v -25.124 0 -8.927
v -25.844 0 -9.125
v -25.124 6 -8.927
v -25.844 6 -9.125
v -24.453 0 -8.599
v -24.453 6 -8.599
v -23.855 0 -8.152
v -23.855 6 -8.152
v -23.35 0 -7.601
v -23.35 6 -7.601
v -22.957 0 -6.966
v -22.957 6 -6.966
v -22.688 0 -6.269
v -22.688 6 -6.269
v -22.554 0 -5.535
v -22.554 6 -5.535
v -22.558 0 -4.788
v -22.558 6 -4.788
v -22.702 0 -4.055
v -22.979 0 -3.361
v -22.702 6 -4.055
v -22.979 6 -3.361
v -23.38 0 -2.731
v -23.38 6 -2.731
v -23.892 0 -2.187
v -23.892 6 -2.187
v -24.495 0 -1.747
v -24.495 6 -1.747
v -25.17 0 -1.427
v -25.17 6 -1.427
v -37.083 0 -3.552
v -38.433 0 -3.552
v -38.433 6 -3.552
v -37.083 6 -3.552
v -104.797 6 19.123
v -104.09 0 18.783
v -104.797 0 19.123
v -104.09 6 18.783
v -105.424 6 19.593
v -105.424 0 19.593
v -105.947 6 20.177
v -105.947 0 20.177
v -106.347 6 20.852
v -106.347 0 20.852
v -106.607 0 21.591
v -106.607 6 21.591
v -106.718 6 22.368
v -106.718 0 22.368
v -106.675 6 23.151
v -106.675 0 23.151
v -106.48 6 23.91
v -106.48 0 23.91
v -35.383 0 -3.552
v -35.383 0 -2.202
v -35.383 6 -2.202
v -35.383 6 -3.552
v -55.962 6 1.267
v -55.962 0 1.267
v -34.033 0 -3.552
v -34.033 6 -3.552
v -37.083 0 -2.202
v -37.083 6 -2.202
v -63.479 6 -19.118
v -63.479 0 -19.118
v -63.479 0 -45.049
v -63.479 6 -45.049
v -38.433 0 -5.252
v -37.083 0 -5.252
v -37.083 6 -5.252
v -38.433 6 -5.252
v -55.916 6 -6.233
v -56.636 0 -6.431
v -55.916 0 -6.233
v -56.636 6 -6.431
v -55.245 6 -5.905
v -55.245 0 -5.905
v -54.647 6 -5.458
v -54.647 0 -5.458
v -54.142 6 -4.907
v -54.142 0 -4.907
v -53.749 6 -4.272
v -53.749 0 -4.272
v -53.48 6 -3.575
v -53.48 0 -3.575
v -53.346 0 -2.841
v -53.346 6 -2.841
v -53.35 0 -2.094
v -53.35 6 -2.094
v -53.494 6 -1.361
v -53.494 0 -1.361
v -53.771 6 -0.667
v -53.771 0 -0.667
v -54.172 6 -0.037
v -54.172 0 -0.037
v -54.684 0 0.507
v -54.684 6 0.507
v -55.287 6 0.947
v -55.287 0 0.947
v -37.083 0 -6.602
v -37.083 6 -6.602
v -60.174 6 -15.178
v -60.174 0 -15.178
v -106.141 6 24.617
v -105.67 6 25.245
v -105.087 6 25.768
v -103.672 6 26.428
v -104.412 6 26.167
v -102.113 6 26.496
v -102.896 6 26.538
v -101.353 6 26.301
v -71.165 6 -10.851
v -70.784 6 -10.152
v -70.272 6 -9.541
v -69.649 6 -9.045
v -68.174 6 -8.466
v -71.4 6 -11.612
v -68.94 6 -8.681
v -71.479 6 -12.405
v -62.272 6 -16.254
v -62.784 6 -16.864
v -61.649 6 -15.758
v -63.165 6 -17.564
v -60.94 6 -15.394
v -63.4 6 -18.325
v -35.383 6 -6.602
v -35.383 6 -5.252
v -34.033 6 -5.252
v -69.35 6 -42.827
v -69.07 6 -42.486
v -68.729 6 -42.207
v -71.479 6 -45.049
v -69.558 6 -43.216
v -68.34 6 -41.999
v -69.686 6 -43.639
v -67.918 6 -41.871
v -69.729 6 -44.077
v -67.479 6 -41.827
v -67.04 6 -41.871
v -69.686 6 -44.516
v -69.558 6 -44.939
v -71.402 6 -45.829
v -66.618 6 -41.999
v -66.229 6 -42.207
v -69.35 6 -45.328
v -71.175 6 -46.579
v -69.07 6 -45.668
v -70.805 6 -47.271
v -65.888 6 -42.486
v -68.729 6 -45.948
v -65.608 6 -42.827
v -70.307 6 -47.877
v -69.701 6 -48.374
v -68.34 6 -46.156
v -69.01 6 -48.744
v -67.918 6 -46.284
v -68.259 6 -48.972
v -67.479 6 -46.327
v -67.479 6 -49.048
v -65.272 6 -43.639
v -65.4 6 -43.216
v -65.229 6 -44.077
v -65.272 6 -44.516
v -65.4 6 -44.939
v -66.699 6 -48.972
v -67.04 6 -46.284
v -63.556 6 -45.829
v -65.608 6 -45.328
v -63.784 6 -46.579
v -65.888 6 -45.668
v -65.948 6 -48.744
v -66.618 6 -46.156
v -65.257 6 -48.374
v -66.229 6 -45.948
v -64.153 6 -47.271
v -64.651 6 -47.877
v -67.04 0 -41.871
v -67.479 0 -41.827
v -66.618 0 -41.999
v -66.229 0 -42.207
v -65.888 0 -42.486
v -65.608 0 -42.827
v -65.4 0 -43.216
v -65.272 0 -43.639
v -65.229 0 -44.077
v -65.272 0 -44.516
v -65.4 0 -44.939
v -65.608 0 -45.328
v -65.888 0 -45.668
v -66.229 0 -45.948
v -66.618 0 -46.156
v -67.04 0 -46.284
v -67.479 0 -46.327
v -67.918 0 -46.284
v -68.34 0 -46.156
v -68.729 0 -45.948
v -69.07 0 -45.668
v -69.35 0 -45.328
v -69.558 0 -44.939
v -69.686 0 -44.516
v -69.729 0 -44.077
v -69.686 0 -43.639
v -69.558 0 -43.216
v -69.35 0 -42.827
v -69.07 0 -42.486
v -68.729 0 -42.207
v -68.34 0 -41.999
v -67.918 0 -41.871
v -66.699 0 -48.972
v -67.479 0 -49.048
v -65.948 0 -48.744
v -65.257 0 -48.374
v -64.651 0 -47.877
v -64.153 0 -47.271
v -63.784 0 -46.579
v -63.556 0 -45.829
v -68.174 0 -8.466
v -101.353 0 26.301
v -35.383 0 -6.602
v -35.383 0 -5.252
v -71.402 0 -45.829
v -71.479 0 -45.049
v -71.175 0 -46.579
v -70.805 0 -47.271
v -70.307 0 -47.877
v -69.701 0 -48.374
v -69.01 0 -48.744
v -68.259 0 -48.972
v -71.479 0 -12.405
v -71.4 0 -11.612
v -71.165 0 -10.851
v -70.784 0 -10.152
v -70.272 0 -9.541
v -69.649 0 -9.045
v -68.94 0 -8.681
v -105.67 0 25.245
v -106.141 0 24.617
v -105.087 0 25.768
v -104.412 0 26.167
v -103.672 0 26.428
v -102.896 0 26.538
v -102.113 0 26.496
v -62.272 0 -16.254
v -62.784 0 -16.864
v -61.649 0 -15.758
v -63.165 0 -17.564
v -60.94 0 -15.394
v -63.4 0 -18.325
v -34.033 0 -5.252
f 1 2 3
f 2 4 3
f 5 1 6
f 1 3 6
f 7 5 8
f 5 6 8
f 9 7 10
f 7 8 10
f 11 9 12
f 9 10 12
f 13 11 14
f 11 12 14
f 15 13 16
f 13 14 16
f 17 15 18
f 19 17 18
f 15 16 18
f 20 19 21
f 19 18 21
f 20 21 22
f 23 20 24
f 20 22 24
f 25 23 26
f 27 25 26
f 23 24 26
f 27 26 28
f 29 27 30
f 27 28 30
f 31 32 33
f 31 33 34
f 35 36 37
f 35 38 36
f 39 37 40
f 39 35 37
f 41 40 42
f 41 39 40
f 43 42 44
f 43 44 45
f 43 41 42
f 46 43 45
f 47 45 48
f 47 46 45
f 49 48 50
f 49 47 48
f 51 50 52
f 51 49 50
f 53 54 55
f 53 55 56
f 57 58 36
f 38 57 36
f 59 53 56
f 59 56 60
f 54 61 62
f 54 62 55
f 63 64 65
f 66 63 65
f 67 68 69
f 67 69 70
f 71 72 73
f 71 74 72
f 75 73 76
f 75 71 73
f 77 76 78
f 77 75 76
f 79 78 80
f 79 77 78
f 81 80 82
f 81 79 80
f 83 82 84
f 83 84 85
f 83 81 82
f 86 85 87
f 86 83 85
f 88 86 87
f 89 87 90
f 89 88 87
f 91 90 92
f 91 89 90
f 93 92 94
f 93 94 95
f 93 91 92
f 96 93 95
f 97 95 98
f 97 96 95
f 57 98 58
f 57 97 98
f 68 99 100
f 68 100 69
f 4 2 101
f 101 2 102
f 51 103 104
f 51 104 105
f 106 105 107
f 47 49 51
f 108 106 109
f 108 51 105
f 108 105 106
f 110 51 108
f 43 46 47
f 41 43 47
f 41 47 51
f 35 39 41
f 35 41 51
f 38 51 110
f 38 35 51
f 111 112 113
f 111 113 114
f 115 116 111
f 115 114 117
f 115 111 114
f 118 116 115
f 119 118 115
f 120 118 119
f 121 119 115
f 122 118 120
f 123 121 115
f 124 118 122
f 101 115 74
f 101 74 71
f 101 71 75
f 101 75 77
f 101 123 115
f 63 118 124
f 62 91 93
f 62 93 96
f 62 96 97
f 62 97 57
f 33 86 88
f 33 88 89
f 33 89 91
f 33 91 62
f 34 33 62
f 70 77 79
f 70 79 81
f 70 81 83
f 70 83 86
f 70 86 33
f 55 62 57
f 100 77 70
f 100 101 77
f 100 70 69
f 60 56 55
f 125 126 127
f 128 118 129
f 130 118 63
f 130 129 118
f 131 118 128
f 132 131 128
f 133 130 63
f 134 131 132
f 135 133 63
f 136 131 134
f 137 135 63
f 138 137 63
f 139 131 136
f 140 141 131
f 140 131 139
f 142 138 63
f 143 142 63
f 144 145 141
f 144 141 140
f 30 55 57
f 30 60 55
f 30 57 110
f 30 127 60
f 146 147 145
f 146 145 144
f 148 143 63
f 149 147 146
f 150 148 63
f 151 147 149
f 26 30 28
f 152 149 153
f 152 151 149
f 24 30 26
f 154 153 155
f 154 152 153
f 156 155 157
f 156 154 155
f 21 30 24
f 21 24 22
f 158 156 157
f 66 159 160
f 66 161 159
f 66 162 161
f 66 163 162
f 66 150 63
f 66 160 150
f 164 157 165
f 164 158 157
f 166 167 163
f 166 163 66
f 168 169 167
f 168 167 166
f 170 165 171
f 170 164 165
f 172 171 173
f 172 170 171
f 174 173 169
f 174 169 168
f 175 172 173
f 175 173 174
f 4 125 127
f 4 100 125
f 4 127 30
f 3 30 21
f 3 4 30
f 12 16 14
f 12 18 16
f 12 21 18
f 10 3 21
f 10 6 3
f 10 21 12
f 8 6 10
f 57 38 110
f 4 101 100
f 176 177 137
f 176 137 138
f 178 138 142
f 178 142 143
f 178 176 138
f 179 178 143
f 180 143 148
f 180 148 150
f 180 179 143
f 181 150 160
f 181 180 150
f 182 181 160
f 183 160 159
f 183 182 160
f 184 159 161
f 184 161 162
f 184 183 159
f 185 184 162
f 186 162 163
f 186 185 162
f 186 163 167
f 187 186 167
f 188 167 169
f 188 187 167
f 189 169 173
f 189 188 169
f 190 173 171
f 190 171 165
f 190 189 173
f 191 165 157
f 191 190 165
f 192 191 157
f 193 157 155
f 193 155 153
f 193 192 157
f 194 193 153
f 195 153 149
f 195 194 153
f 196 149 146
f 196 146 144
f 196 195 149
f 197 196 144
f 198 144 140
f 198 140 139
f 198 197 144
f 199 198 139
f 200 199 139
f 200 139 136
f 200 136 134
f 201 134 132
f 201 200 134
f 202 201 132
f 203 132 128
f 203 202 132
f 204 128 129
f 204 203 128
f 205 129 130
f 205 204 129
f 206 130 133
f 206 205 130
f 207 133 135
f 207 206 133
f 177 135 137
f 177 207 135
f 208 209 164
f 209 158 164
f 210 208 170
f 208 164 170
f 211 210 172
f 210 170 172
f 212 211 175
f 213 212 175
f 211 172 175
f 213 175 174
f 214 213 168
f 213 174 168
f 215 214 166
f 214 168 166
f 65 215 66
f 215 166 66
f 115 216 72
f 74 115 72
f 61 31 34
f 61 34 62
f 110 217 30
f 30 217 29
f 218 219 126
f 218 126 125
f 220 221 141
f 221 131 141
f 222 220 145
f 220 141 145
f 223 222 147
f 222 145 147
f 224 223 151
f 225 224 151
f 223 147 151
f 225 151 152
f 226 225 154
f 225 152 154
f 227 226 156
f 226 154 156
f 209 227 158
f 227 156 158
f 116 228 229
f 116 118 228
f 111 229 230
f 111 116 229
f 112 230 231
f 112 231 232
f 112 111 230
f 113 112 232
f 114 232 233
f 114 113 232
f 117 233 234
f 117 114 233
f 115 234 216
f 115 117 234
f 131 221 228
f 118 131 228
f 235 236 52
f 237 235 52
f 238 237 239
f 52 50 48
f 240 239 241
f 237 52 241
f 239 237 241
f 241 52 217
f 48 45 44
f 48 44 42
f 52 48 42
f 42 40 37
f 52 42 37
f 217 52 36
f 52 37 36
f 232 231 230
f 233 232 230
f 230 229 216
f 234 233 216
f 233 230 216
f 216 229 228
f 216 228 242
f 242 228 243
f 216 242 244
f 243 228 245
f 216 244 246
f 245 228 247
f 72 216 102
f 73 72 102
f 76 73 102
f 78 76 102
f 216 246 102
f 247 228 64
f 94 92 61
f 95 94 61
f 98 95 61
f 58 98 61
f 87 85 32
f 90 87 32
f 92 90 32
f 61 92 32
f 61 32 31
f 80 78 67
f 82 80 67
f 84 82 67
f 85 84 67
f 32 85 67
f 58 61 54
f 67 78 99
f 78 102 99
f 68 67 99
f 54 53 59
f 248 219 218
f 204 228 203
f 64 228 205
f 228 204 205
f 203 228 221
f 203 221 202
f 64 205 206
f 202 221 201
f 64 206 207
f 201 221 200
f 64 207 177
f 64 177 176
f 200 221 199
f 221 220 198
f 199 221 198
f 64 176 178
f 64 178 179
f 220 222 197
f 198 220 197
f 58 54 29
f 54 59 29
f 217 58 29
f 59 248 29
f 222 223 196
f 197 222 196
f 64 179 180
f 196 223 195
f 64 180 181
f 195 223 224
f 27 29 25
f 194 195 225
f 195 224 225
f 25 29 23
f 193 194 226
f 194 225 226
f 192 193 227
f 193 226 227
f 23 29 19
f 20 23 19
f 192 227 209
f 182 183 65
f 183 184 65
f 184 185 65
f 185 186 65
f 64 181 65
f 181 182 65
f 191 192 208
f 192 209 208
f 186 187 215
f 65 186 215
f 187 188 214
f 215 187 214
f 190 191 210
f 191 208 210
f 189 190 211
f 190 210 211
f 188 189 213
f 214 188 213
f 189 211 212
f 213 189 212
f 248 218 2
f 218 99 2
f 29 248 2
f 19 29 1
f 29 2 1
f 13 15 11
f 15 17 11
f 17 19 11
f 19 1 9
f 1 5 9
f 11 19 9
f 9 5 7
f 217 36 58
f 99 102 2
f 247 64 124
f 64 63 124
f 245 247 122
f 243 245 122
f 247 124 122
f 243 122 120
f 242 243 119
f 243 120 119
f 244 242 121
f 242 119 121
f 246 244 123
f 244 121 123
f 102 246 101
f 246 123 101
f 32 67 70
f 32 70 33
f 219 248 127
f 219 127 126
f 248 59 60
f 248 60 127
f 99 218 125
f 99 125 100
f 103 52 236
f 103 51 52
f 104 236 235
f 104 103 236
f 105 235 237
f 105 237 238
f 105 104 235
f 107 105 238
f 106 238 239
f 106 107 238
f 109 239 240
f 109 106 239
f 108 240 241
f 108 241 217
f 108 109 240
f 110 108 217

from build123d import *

# Parameters (mm, degrees)
SKETCH1_R           = 2.25
BOSS_EXTRUDE1_DEPTH = 6
FILLET1_R           = 4


with BuildPart() as part:
    # Sketch1 → Boss-Extrude1 (new body)
    with BuildSketch(Plane(origin=(0, 0, 0), x_dir=(1, 0, 0), z_dir=(0, 1, 0))):
        Polygon((-71.479040749, 49.048444694), (-71.479040749, 9.048444694), (-41.934808158, 3.838999364), (-107.848225403, -20.151522552), (-105.112064256, -27.669063518), (-11.142802178, 6.532950815), (-63.479040749, 15.761241744), (-63.479040749, 49.048444694), align=None)
        with Locations(Location((-67.479040749, 44.077475717, 0), (0, 0, 270))):
            Circle(SKETCH1_R, mode=Mode.SUBTRACT)
        Polygon((-38.433012349, 5.25170526), (-38.433012349, 3.55170526), (-37.083012349, 3.55170526), (-37.083012349, 2.20170526), (-35.383012349, 2.20170526), (-35.383012349, 3.55170526), (-34.033012349, 3.55170526), (-34.033012349, 5.25170526), (-35.383012349, 5.25170526), (-35.383012349, 6.60170526), (-37.083012349, 6.60170526), (-37.083012349, 5.25170526), align=None, mode=Mode.SUBTRACT)
    extrude(amount=BOSS_EXTRUDE1_DEPTH)

    # Fillet1
    fillet1_edges = [part.edges().sort_by_distance(p)[0] for p in [
        (-63.479040749, 3, -15.761241744),
        (-71.479040749, 3, -9.048444694),
        (-105.112064256, 3, 27.669063518),
        (-107.848225403, 3, 20.151522552),
        (-41.934808158, 3, -3.838999364),
        (-11.142802178, 3, -6.532950815),
        (-63.479040749, 3, -49.048444694),
        (-71.479040749, 3, -49.048444694),
    ]]
    fillet(fillet1_edges, radius=FILLET1_R - 0.0001)  # a hair under: the kernel refuses the full size


solid = part.part
